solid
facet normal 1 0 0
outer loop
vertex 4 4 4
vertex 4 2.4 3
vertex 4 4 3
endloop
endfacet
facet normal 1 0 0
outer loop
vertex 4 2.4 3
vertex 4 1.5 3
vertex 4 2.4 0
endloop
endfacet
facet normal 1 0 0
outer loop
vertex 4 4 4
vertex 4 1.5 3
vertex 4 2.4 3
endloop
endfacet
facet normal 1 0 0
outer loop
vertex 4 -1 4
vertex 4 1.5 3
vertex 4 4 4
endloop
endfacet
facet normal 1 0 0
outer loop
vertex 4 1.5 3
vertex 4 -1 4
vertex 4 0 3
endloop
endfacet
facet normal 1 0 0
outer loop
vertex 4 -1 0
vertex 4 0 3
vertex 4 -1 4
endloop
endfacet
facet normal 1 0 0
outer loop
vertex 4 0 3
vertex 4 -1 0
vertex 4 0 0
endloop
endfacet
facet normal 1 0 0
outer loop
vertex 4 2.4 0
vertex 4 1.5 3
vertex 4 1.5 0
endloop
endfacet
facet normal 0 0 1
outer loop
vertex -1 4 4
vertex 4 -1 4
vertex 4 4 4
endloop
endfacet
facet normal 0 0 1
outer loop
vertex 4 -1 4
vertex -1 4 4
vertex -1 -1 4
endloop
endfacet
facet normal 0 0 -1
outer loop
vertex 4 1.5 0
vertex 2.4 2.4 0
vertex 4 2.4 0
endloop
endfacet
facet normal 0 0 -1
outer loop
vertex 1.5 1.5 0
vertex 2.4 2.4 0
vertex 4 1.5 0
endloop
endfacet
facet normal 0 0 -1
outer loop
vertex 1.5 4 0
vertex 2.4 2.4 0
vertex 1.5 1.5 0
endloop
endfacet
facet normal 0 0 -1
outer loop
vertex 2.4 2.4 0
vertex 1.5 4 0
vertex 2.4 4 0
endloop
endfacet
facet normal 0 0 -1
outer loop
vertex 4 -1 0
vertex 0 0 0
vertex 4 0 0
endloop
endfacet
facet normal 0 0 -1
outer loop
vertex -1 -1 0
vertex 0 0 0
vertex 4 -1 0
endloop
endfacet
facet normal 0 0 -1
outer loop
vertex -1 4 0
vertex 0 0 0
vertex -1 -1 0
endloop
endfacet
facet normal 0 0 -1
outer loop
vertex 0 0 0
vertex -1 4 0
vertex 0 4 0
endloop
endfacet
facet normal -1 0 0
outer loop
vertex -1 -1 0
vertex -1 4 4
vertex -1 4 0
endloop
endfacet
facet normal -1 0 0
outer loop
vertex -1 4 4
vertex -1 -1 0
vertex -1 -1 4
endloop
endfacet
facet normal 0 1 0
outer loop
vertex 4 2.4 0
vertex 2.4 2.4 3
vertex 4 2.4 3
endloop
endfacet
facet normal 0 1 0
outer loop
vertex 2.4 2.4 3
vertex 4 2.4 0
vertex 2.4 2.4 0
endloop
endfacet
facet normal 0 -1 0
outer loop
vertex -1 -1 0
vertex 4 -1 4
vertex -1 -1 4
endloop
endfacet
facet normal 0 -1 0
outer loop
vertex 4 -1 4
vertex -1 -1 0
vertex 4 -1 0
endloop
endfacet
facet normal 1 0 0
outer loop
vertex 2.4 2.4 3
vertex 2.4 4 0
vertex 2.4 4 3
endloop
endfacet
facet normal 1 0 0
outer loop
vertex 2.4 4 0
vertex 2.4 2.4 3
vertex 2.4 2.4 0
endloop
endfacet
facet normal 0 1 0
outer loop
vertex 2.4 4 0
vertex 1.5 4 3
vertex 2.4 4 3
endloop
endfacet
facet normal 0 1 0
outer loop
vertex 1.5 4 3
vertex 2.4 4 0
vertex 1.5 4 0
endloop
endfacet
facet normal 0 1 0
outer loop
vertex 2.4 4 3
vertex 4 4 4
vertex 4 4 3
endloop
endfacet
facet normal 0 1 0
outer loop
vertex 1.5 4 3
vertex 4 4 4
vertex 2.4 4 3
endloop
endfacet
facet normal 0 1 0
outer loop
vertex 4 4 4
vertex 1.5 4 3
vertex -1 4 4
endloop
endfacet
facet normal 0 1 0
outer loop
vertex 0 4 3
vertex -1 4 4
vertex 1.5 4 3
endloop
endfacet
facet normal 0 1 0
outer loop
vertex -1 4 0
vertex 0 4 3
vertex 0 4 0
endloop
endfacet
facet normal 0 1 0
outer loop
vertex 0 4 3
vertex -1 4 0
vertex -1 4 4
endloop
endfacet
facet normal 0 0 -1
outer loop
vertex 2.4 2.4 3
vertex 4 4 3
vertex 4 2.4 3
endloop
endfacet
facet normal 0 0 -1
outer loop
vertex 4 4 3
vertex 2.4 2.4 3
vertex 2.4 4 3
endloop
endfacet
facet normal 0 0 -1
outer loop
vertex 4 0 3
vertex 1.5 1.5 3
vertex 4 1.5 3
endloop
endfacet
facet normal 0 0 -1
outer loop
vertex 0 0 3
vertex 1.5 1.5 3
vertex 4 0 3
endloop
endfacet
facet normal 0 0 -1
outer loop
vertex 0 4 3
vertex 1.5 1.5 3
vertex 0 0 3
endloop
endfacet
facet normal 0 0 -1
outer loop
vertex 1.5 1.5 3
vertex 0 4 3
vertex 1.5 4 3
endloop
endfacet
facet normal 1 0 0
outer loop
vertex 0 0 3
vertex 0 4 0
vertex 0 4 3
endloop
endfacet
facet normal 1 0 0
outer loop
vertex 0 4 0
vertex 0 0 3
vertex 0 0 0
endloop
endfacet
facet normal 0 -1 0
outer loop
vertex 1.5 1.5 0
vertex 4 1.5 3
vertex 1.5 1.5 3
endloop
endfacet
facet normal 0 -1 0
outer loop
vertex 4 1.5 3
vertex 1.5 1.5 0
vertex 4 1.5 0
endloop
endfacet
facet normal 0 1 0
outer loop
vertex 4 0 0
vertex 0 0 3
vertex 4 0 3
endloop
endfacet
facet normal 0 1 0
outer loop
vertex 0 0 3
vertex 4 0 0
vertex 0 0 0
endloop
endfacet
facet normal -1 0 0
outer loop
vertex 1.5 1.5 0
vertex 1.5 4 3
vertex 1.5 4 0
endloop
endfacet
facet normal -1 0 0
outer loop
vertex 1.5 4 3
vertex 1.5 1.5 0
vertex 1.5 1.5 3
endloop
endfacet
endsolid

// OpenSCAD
// ===========================================================================
// PLEXI CORNER CLIP — joins two 1.5 mm plexiglass panels at a 90° butt corner.
// A small corner CAP. Built the clean way: one solid L-block wraps the outside
// corner, then a 1.5 mm slot is CUT down each arm. What's left is a proper
// U-channel on each panel (outer wall + inner lip, equal and regular) joined
// solidly through the corner, with a top that caps the panel top edges and ties
// it all together. Push it down onto the top corner; friction holds it.
// Same parametric press-fit idea as the awning channels. Units = mm.
//
// Plan (looking down the corner): outside corner at the origin.
//   Panel A runs +X, outer face on y=0   (slot y: 0..t)
//   Panel B runs +Y, outer face on x=0   (slot x: 0..t)
//   Clip body wraps the -X,-Y outside.   Inside (cars) = +X,+Y.
// ===========================================================================

/* [ Fit ] */
t      = 1.5;    // plexi panel thickness
clear  = 0.00;   // slot clearance: 0 = snug press, +0.1 looser, -0.1 tighter
slot   = t + clear;

/* [ Size ] */
arm    = 4.0;    // how far the clip runs along each panel
ht     = 4.0;    // overall height (along the corner)
wall   = 1.0;    // outer shell wall thickness
lip    = 0.9;    // inner lip thickness (grips the panel's inner face)
toph   = 1.0;    // top thickness (caps the panel tops + ties it together)

cross  = wall + slot + lip;   // full width of each arm = outer wall + slot + lip
$fn    = 32;

module clip() {
  union() {
    // --- two slotted arms: solid bar with the 1.5 mm panel slot cut in ---
    difference() {
      union() {
        translate([-wall, -wall, 0]) cube([arm + wall, cross, ht]);   // arm A (+X)
        translate([-wall, -wall, 0]) cube([cross, arm + wall, ht]);   // arm B (+Y)
      }
      translate([0, 0, -0.01]) cube([arm + 1, slot, ht - toph + 0.01]); // slot A
      translate([0, 0, -0.01]) cube([slot, arm + 1, ht - toph + 0.01]); // slot B
    }
    // --- square top slab: caps the panel top edges + ties it all together -
    translate([-wall, -wall, ht - toph]) cube([arm + wall, arm + wall, toph]);
  }
}

clip();
